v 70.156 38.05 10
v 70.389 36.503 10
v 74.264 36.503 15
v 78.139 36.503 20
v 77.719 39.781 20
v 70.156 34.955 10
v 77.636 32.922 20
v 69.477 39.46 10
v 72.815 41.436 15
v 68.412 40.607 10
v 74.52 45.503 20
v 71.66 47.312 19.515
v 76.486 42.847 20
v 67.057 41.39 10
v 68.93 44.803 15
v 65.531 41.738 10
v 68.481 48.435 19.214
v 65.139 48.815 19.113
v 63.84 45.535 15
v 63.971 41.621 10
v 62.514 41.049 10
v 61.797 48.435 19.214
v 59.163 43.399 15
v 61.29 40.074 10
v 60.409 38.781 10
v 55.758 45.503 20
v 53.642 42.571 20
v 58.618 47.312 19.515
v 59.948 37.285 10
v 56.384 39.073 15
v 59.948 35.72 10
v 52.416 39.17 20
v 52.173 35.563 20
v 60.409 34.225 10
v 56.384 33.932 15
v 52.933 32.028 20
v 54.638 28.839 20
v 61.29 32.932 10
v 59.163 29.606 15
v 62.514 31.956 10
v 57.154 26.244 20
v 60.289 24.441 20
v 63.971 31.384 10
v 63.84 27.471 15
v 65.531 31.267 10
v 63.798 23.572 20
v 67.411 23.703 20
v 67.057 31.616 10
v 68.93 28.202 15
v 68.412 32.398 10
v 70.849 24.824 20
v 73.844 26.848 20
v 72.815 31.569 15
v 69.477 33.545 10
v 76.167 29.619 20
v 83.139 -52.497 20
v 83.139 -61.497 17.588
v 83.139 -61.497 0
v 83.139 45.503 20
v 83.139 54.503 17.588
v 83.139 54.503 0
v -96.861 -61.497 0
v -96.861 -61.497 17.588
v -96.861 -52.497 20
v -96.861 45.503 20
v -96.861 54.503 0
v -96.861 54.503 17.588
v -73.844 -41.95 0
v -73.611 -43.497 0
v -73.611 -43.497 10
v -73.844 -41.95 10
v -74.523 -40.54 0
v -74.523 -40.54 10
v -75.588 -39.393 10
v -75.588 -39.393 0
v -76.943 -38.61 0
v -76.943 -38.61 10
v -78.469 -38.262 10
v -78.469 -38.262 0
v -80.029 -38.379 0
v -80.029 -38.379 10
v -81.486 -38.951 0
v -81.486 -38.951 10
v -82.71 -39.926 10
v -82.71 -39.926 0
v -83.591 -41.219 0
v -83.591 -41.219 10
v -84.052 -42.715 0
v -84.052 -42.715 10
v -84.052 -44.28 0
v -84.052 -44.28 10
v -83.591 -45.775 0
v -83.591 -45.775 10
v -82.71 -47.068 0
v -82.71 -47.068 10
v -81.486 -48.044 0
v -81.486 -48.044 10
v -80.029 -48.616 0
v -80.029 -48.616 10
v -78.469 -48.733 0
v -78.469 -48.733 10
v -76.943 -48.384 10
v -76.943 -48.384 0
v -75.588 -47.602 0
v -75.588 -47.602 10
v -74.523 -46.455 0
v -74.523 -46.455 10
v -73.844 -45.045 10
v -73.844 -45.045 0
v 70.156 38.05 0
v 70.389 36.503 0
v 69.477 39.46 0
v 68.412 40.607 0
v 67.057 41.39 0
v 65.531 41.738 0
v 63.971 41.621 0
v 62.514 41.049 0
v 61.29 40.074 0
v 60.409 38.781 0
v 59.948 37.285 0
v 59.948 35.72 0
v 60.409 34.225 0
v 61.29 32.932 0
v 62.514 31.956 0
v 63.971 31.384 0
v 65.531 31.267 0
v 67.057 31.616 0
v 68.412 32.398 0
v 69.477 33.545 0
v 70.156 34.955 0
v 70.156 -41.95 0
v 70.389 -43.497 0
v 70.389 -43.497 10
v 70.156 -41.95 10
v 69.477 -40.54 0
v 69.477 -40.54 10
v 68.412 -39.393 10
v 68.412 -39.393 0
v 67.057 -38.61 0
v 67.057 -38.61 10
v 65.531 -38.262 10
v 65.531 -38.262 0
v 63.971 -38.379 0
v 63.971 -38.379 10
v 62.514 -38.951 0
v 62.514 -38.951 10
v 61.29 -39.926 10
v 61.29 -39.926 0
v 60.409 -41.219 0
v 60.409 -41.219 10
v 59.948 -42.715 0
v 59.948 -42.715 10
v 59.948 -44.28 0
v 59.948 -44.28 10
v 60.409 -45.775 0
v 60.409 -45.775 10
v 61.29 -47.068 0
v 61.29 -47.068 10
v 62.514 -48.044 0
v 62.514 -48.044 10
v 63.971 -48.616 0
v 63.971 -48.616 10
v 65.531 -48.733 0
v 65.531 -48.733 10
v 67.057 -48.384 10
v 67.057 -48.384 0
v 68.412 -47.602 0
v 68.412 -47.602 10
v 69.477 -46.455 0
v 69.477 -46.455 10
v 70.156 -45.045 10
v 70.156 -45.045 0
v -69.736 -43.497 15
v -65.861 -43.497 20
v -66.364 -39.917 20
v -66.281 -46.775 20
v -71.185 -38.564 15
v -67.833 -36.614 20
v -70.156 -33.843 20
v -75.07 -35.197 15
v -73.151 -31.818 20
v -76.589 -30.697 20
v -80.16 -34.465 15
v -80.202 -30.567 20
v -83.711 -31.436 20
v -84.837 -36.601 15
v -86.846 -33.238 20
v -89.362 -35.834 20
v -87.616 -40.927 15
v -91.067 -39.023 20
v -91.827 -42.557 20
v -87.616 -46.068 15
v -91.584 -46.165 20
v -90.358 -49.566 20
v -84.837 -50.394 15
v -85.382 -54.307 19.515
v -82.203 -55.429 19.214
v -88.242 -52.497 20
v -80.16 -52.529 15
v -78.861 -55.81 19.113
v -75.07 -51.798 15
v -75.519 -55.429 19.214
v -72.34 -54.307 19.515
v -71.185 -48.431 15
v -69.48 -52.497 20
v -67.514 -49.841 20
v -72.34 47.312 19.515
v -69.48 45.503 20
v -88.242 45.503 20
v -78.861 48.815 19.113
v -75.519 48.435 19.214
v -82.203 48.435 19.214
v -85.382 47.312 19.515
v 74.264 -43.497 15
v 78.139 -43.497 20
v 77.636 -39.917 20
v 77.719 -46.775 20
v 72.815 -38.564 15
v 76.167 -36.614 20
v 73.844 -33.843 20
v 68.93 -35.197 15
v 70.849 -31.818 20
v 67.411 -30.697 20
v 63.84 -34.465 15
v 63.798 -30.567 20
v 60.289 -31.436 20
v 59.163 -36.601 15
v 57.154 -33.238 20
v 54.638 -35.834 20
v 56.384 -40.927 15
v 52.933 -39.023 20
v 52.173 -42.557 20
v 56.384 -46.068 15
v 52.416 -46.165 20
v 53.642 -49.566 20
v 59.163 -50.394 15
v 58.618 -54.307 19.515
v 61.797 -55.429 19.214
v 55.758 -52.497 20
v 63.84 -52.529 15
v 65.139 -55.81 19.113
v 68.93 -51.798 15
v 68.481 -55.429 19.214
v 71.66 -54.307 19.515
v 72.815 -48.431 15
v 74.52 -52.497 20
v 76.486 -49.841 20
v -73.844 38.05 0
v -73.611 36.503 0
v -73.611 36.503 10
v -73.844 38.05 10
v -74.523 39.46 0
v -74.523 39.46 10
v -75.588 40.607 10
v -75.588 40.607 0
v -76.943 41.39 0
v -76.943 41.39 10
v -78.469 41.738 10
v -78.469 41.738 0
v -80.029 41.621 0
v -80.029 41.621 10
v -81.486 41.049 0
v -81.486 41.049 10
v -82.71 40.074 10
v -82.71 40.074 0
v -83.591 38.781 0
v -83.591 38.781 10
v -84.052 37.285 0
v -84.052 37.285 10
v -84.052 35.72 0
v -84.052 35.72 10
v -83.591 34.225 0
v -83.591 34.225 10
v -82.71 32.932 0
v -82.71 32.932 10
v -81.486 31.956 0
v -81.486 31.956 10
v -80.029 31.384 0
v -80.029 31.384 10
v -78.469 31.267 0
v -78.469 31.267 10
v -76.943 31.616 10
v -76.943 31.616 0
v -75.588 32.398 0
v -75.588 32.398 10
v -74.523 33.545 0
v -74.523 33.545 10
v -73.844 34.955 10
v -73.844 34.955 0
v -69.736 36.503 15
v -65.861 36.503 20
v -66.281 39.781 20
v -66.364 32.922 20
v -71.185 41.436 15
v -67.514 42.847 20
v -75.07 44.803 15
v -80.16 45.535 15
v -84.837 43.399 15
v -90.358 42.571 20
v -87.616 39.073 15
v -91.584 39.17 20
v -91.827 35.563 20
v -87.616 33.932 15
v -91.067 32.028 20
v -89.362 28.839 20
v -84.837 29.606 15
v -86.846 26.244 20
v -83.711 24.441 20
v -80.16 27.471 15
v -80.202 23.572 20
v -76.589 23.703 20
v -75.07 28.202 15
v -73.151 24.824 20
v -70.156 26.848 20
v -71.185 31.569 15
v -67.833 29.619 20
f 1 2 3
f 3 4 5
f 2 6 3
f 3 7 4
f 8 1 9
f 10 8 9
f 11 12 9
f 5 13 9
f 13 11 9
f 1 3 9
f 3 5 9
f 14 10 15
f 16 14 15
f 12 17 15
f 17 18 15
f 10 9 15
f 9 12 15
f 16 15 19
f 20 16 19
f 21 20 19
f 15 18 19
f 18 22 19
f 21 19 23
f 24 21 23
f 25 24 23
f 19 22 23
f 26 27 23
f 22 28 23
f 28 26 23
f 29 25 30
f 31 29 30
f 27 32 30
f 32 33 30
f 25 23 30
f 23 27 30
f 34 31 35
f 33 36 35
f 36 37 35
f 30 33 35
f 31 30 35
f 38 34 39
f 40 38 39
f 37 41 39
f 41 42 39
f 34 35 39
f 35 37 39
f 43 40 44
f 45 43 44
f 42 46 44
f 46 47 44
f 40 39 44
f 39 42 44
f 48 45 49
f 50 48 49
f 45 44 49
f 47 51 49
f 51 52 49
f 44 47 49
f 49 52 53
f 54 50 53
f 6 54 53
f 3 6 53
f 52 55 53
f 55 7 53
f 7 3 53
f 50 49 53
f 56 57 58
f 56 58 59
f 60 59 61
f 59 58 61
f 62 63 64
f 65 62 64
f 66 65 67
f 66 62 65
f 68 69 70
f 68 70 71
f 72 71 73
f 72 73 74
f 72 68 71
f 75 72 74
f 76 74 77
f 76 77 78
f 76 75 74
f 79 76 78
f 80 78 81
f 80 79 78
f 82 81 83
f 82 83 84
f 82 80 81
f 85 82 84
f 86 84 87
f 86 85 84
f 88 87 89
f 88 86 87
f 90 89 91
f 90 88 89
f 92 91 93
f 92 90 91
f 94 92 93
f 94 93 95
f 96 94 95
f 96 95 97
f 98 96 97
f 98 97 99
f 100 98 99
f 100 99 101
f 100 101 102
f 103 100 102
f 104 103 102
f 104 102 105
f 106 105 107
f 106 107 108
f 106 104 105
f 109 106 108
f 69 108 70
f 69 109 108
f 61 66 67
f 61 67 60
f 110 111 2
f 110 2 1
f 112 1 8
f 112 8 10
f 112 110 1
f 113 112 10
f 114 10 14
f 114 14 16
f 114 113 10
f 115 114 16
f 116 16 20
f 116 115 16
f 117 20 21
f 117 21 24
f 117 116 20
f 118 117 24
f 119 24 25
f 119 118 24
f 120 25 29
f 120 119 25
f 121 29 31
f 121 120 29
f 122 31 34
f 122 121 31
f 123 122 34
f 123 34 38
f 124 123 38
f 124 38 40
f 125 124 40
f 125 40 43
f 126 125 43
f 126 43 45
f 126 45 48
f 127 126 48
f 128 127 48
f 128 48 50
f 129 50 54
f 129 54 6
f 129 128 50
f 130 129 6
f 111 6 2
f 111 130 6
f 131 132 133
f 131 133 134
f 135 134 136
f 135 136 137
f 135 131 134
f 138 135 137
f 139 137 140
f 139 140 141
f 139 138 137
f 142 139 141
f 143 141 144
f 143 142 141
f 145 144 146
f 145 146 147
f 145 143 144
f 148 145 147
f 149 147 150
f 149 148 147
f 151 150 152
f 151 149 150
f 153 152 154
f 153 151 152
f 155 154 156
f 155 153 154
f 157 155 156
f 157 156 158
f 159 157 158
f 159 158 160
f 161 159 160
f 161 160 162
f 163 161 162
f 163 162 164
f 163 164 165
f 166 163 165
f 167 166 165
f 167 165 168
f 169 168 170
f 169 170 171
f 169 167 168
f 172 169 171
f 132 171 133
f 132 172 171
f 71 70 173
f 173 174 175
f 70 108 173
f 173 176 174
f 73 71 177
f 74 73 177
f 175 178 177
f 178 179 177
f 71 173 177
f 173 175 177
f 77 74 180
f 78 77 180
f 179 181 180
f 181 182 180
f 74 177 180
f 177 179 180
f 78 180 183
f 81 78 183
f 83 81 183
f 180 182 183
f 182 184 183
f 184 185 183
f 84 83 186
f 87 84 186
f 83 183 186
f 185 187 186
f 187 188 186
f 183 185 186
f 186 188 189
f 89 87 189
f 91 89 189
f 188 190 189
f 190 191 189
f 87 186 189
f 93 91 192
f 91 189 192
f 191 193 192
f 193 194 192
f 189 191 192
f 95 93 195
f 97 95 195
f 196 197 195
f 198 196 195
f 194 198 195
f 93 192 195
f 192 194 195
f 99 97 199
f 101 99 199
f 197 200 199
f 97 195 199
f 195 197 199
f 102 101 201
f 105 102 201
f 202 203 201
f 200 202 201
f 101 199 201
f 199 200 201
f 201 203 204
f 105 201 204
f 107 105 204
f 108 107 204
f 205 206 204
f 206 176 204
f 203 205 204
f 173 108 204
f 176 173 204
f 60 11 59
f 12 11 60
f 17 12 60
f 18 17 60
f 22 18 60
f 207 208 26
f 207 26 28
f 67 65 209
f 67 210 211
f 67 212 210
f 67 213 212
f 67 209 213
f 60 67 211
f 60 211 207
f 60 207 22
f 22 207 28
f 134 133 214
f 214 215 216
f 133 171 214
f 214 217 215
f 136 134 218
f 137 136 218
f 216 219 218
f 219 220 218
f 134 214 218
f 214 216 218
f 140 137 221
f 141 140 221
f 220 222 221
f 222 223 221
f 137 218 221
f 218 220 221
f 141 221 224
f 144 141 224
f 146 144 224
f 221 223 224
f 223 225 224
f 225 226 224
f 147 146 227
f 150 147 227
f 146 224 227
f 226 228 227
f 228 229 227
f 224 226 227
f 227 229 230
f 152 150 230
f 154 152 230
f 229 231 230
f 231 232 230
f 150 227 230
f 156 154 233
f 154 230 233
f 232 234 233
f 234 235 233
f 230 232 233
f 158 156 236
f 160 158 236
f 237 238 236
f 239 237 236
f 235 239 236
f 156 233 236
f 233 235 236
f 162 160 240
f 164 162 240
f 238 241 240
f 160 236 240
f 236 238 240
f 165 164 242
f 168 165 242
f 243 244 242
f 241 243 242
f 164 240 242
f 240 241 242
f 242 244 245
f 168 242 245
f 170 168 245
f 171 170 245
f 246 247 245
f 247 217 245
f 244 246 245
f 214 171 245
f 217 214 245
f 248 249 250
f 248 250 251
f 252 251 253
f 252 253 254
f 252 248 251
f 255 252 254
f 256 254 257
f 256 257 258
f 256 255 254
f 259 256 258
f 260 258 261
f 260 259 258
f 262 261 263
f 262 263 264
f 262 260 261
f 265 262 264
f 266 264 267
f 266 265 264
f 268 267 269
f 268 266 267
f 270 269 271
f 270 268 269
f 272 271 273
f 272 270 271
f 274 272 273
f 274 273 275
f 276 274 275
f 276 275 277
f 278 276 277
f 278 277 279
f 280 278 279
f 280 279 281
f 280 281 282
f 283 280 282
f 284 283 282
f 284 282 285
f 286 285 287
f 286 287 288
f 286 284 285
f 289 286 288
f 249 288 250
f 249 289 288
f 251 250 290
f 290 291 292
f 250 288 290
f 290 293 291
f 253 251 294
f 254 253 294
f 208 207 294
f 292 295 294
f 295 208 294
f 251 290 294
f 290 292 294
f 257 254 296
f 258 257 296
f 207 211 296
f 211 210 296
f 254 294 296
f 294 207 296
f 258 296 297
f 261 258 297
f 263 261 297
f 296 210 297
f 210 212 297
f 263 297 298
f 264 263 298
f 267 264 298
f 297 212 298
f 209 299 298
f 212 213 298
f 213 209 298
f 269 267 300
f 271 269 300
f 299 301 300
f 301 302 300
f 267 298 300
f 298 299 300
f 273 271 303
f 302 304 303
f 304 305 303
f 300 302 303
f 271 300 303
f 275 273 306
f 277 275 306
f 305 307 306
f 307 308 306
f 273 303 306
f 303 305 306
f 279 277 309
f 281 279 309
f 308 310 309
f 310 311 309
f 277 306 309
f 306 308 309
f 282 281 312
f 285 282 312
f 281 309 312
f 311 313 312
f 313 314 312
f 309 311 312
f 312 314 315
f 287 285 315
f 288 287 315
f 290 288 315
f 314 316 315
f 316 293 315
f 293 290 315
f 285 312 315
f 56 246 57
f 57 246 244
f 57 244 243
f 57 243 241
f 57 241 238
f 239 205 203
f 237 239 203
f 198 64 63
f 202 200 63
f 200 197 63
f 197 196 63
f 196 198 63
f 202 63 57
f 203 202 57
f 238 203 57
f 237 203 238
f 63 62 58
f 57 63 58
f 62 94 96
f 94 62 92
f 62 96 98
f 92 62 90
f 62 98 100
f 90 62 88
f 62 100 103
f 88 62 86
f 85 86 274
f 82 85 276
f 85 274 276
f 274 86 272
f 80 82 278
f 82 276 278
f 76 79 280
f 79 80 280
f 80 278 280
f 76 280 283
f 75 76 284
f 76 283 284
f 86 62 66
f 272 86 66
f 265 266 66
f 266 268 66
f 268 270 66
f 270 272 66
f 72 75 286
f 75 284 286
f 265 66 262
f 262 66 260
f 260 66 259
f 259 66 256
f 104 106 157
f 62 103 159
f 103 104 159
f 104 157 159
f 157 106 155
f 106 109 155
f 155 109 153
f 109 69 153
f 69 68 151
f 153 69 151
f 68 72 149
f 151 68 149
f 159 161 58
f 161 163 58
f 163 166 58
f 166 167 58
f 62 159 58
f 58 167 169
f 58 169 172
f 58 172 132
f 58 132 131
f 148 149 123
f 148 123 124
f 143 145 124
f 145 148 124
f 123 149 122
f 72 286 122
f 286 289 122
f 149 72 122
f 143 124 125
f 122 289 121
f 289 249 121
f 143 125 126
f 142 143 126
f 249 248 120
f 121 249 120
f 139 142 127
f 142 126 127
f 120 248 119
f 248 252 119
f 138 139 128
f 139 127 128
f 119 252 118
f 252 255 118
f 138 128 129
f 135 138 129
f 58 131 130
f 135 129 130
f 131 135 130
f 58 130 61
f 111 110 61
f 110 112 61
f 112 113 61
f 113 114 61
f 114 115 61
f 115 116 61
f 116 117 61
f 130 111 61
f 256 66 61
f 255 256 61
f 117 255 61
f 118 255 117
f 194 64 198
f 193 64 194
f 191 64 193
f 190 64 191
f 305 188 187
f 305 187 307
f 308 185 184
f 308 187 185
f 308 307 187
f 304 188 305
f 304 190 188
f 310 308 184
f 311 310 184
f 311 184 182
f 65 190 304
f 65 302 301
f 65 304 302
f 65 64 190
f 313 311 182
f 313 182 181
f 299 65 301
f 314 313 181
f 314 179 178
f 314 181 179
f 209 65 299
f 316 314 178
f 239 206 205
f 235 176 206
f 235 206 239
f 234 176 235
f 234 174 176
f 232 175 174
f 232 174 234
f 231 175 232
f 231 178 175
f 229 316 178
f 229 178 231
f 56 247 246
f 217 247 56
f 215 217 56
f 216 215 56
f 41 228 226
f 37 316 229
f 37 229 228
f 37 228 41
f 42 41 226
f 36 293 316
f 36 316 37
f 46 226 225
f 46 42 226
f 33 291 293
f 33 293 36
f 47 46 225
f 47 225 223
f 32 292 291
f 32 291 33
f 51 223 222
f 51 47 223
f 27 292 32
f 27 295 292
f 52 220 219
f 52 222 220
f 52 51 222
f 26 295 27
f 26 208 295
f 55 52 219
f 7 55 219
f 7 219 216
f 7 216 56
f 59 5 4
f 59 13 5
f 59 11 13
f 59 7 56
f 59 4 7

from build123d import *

# Parameters (mm, degrees)
F0_W        = 180
F0_H        = 116
F0_R        = 5.25
F1_DEPTH    = 20
F2_SIZE2    = 7.75
F2_SIZE     = 10
F2_2_SIZE2  = 7.75
F2_2_SIZE   = 10
F2_3_SIZE2  = 7.75
F2_3_SIZE   = 10
F2_4_SIZE2  = 7.75
F2_4_SIZE   = 10
F3_T1_DEPTH = 226.7409882636


# Not quite as in the source:
# - a fillet or chamfer that OpenCascade refuses, or shapes differently, is made with other operations: its cross-section is extruded or revolved along the edge and cut away or added


with BuildPart() as f1:
    # F0 (on Top) → F1 (new body)
    with BuildSketch(Plane.XY):
        with Locations((-6.8610161543, -3.4973233796)):
            Rectangle(F0_W, F0_H)
        with Locations((-78.8610161543, -43.4973233796)):
            Circle(F0_R, mode=Mode.SUBTRACT)
        with Locations((65.1389838457, -43.4973233796)):
            Circle(F0_R, mode=Mode.SUBTRACT)
        with Locations((-78.8610161543, 36.5026766204)):
            Circle(F0_R, mode=Mode.SUBTRACT)
        with Locations((65.1389838457, 36.5026766204)):
            Circle(F0_R, mode=Mode.SUBTRACT)
    extrude(amount=F1_DEPTH)

    # F2
    f2_edges = [f1.edges().sort_by_distance(p)[0] for p in [
        (59.888984, -43.497323, 20),
    ]]
    f2_side = f1.faces().sort_by_distance((59.888984, -43.497323, 10))[0]
    chamfer(f2_edges, length=F2_SIZE, length2=F2_SIZE2, reference=f2_side)

    # F2#2
    f2_2_edges = [f1.edges().sort_by_distance(p)[0] for p in [
        (-84.111016, -43.497323, 20),
    ]]
    f2_2_side = f1.faces().sort_by_distance((-84.111016, -43.497323, 10))[0]
    chamfer(f2_2_edges, length=F2_2_SIZE, length2=F2_2_SIZE2, reference=f2_2_side)

    # F2#3
    f2_3_edges = [f1.edges().sort_by_distance(p)[0] for p in [
        (-84.111016, 36.502677, 20),
    ]]
    f2_3_side = f1.faces().sort_by_distance((-84.111016, 36.502677, 10))[0]
    chamfer(f2_3_edges, length=F2_3_SIZE, length2=F2_3_SIZE2, reference=f2_3_side)

    # F2#4
    f2_4_edges = [f1.edges().sort_by_distance(p)[0] for p in [
        (59.888984, 36.502677, 20),
    ]]
    f2_4_side = f1.faces().sort_by_distance((59.888984, 36.502677, 10))[0]
    chamfer(f2_4_edges, length=F2_4_SIZE, length2=F2_4_SIZE2, reference=f2_4_side)

    # F3: chamfer of 9 x 2.4115427319 on 2 edges, made by hand

    # F3_s2 → F3_t1 (cut)
    with BuildSketch(Plane.YZ.offset(-120.2315102861)):
        Polygon((-52.4973233796, 20), (-61.4973233796, 17.5884572681), (-61.4973233796, 20), align=None)
        Polygon((45.5026766204, 20), (54.5026766204, 17.5884572681), (54.5026766204, 20), align=None)
    extrude(amount=F3_T1_DEPTH, mode=Mode.SUBTRACT)


solid = f1.part
